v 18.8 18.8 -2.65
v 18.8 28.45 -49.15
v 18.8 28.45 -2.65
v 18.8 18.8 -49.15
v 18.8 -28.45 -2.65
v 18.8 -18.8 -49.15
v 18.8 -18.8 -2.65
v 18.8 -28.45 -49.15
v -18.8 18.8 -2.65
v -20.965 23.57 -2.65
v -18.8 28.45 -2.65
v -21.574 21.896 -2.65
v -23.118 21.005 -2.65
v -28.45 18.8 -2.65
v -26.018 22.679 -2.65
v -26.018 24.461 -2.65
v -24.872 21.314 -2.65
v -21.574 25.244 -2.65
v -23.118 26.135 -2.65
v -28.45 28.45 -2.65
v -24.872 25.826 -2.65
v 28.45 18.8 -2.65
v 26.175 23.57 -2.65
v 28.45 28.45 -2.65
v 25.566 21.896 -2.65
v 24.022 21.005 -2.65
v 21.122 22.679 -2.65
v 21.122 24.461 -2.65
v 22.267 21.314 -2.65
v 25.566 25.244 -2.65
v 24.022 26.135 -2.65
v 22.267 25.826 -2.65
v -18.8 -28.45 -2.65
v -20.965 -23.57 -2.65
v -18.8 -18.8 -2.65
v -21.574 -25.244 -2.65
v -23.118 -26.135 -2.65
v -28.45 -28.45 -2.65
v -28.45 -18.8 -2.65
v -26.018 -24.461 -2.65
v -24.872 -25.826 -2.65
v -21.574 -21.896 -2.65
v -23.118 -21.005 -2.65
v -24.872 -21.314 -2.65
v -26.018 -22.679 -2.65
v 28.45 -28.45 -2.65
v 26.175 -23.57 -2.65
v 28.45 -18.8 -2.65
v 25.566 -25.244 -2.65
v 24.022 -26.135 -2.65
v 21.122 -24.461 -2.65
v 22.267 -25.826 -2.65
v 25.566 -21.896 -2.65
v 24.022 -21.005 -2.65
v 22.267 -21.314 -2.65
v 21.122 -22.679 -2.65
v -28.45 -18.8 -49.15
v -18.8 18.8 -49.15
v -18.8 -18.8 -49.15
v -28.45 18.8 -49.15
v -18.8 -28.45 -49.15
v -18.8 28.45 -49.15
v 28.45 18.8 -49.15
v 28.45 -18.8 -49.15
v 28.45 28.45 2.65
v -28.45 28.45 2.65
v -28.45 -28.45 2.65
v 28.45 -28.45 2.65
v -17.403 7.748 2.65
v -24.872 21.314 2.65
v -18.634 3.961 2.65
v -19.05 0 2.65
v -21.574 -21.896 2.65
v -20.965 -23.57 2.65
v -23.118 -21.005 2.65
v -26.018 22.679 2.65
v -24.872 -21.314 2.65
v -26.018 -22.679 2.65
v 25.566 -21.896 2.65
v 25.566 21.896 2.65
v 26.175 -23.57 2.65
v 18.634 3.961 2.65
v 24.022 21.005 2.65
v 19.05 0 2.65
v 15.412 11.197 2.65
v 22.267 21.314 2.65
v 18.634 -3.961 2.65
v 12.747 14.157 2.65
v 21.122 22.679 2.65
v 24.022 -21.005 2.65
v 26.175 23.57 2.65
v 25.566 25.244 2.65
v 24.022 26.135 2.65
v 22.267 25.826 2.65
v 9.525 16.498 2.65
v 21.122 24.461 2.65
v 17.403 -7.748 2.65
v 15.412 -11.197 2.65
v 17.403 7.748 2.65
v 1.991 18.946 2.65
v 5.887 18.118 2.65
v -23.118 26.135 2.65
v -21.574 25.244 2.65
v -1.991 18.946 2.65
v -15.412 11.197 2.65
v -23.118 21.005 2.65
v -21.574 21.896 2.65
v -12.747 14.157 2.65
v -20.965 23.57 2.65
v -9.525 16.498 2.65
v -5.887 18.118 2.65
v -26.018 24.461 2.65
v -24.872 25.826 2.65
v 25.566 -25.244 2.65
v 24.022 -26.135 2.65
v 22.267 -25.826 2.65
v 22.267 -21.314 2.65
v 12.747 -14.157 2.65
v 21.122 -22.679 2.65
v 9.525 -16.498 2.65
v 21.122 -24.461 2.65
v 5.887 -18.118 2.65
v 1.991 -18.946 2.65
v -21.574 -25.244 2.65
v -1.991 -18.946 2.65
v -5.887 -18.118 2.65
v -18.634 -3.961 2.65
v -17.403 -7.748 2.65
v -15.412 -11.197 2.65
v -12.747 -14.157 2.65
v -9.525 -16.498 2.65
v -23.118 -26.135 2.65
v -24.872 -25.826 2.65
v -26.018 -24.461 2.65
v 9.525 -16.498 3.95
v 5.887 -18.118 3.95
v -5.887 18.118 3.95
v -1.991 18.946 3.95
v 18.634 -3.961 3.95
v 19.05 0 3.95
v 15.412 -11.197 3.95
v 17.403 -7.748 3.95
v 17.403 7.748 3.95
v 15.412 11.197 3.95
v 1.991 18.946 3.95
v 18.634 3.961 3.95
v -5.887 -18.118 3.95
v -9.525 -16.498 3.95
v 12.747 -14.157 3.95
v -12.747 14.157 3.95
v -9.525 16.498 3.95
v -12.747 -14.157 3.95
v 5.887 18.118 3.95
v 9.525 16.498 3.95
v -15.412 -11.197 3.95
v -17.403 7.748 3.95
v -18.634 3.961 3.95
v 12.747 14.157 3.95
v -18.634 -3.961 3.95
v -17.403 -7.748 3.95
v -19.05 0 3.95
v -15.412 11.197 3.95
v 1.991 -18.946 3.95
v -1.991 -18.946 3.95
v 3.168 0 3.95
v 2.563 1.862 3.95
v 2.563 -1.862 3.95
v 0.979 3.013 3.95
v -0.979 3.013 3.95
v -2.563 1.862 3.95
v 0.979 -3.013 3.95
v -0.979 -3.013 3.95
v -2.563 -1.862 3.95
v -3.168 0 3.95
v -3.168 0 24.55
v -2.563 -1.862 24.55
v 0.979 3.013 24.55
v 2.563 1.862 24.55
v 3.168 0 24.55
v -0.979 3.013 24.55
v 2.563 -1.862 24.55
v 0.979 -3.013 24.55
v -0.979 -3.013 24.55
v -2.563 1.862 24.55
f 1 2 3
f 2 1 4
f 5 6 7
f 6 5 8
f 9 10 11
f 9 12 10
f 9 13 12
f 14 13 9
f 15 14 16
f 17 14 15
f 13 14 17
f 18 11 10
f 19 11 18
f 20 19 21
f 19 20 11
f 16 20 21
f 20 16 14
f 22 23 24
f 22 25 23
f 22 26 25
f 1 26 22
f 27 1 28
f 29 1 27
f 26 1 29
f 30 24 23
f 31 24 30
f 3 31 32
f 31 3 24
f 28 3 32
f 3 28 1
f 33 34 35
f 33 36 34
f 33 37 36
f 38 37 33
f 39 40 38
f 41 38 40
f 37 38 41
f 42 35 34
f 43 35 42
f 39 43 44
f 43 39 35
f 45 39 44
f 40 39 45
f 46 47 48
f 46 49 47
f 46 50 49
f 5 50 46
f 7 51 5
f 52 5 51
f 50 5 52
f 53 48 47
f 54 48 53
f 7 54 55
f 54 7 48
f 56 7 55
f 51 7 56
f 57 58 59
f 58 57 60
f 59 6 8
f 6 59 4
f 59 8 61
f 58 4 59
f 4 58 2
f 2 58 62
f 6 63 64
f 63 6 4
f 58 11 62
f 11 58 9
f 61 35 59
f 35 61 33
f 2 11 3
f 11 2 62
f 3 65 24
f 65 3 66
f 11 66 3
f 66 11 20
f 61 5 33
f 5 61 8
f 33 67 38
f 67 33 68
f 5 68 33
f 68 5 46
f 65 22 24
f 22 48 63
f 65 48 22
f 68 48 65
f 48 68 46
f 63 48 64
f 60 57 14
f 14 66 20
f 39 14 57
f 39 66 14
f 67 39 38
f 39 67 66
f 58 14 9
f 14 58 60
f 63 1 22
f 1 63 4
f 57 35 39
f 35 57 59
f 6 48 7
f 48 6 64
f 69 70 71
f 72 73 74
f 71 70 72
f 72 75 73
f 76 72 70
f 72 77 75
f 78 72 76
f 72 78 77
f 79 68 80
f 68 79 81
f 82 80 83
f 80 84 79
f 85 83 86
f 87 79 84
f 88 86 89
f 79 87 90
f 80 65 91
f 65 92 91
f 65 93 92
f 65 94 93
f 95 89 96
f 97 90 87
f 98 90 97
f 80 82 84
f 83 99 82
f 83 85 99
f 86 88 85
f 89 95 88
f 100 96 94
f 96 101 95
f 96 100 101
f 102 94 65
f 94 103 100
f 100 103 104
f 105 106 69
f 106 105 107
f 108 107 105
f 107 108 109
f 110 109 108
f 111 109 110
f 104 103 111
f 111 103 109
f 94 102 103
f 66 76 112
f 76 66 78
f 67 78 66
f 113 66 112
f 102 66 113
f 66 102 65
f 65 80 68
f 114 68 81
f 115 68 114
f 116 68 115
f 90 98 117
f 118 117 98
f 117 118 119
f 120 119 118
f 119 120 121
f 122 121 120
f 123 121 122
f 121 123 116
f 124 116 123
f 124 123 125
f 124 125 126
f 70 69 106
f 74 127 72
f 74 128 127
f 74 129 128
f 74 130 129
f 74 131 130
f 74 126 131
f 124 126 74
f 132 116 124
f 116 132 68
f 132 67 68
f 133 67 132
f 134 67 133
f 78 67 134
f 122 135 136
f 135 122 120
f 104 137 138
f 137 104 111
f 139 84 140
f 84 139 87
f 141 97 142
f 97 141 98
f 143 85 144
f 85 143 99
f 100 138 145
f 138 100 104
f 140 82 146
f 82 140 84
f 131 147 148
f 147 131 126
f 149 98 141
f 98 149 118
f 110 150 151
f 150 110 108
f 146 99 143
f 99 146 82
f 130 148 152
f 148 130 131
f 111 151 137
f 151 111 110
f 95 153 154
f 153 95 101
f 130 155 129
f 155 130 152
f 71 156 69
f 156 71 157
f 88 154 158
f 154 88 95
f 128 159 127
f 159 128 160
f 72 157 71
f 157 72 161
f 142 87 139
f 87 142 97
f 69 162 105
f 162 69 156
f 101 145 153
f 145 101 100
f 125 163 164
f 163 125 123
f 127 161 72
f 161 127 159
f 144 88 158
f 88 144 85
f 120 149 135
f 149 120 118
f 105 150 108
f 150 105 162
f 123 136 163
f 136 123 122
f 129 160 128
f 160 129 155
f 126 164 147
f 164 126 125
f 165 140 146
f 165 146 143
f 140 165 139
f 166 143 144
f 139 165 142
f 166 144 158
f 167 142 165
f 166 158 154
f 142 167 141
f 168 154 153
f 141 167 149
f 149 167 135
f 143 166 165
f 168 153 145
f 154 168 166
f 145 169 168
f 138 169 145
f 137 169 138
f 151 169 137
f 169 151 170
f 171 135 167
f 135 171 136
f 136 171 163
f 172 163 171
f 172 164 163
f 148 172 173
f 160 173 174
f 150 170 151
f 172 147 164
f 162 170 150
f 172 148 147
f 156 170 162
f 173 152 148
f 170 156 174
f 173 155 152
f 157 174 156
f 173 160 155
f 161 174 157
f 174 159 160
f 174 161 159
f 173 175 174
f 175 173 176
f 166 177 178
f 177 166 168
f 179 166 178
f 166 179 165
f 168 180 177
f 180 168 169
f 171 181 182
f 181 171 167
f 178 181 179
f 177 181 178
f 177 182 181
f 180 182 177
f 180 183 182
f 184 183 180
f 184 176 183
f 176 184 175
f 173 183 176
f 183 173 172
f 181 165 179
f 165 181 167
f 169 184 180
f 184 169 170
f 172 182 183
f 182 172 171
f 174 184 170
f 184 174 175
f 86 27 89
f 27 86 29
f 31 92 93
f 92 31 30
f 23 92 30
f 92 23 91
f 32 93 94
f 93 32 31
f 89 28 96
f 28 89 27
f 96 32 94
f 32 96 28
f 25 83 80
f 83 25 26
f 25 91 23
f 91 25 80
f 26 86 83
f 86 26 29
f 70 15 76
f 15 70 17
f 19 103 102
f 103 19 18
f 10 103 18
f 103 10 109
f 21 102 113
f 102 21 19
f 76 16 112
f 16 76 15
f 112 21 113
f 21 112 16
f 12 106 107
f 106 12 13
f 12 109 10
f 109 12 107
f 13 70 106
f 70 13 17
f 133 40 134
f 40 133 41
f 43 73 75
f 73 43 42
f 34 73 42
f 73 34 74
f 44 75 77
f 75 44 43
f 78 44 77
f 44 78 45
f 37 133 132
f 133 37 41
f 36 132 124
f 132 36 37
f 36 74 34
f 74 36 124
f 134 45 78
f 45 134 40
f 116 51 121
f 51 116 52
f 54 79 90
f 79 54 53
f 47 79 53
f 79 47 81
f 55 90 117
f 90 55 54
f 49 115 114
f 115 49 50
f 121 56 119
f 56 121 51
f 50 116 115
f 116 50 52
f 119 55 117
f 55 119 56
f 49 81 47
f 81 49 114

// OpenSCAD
// Model: NEMA23
// Model: NEMA17
// Author: Bogdan Kecman
// Licence: GPL
//
// Usage:
// nema17(1); //nema17 double shaft
// nema17(); //nema17 siingle shaft
// nema23(1, 1); //nema23 double shaft cylinder
// nema23(1); //nema23 double shaft cube
// nema23(); //nema23 single shaft cube
// nema23(0,1); //nema23 single shaft cylinder



module nema23(has_back, is_cylinder){
  mplate = 56.9; //mounting plate width
  mplateH = 5.3; //mounting plate height

  ringR = 38.10 / 2; //ring radius
  ringH = 1.3; //ring thickness

  shaftR = 6.337/2; //shaft radius
  shaftH = 20.6;  //shaft lenght

  bodyL = 46.5; //46.5, 56.1, 77.7, 103.1, ...
  bodyInnerCube = 37.6;

  holeR = 5.21/2;
  holeL = 47.14/2; //distance between hole centres

  difference(){
    union(){
      //mounting plate
      color([0.7,0.7,0.7]) cube(size = [mplate,mplate,mplateH], center = true);
      //ring
      color([0.7,0.7,0.7]) translate(v=[0,0,mplateH/2+ringH/2]) cylinder(r=ringR, h=ringH, center=true);
      //shaft front
      color([0.9,0.9,0.9]) translate(v=[0,0,mplateH/2+ringH+shaftH/2])cylinder(r=shaftR, h=shaftH, center=true);
      if (has_back == 1){
        color([0.9,0.9,0.9])  translate(v=[0,0,0-bodyL-shaftH/2]) cylinder(r=shaftR, h=shaftH, center=true);
      }
      //body
      if (is_cylinder == 1){
        color([0.1,0.1,0.1]) translate(v=[0,0,0-mplateH/2-bodyL/2]) cylinder(r=mplate/2, h=bodyL, center=true);
      }else{
        union(){
          color([0.1,0.1,0.1]) translate(v=[0,0,0-mplateH/2-bodyL/2]) cube(size = [bodyInnerCube, mplate, bodyL], center=true);
          color([0.1,0.1,0.1]) translate(v=[0,0,0-mplateH/2-bodyL/2]) cube(size = [mplate,bodyInnerCube, bodyL], center=true);
        }
      }
    }
    translate(v=[holeL,holeL,0]) cylinder(r = holeR, h = 2*mplateH, center=true);
    translate(v=[-holeL,holeL,0]) cylinder(r = holeR, h = 2*mplateH, center=true);
    translate(v=[-holeL,-holeL,0]) cylinder(r = holeR, h = 2*mplateH, center=true);
    translate(v=[holeL,-holeL,0]) cylinder(r = holeR, h = 2*mplateH, center=true);
  }
  
}

module nema17(has_back, is_cylinder){
  mplate = 42.67; //mounting plate width
  mplateH = 0; //mounting plate height

  ringR = 22 / 2; //ring radius, can be 21.95/2
  ringH = 2; //ring thickness

  shaftR = 5/2; //shaft radius, can be 4.988/2
  shaftH = 20.07;  //shaft lenght

  bodyL = 46.5; //25.3, 33.13, 34.7, 40.9, 47.0, ...

  holeR = 3.5/2; //M3 or M4 or #4-40
  holeL = 31.0/2; //distance between hole centres

  difference(){
    union(){
      //ring
      color([0.7,0.7,0.7]) translate(v=[0,0,ringH/2]) cylinder(r=ringR, h=ringH, center=true);
      //shaft front
      color([0.9,0.9,0.9]) translate(v=[0,0,ringH+shaftH/2])cylinder(r=shaftR, h=shaftH, center=true);
      if (has_back == 1){
        color([0.9,0.9,0.9]) translate(v=[0,0,0-bodyL-shaftH/2]) cylinder(r=shaftR, h=shaftH, center=true);
      }
      //body
      if (is_cylinder == 1){
        color([0.1,0.1,0.1]) translate(v=[0,0,0-bodyL/2]) cylinder(r=mplate/2*1.2, h=bodyL, center=true);
      }else{
        union(){
          color([0.1,0.1,0.1]) translate(v=[0,0,0-bodyL/2]) cube(size = [mplate, mplate, bodyL], center=true);
          color([0.1,0.1,0.1]) translate(v=[0,0,0-bodyL/2]) cube(size = [mplate, mplate, bodyL], center=true);
        }
      }
    }
    translate(v=[holeL,holeL,0-bodyL/2]) cylinder(r = holeR, h = bodyL+10, center=true);
    translate(v=[-holeL,holeL,0-bodyL/2]) cylinder(r = holeR, h = bodyL+10, center=true);
    translate(v=[-holeL,-holeL,0-bodyL/2]) cylinder(r = holeR, h = bodyL+10, center=true);
    translate(v=[holeL,-holeL,0-bodyL/2]) cylinder(r = holeR, h = bodyL+10, center=true);
  }
  
}

nema23();
